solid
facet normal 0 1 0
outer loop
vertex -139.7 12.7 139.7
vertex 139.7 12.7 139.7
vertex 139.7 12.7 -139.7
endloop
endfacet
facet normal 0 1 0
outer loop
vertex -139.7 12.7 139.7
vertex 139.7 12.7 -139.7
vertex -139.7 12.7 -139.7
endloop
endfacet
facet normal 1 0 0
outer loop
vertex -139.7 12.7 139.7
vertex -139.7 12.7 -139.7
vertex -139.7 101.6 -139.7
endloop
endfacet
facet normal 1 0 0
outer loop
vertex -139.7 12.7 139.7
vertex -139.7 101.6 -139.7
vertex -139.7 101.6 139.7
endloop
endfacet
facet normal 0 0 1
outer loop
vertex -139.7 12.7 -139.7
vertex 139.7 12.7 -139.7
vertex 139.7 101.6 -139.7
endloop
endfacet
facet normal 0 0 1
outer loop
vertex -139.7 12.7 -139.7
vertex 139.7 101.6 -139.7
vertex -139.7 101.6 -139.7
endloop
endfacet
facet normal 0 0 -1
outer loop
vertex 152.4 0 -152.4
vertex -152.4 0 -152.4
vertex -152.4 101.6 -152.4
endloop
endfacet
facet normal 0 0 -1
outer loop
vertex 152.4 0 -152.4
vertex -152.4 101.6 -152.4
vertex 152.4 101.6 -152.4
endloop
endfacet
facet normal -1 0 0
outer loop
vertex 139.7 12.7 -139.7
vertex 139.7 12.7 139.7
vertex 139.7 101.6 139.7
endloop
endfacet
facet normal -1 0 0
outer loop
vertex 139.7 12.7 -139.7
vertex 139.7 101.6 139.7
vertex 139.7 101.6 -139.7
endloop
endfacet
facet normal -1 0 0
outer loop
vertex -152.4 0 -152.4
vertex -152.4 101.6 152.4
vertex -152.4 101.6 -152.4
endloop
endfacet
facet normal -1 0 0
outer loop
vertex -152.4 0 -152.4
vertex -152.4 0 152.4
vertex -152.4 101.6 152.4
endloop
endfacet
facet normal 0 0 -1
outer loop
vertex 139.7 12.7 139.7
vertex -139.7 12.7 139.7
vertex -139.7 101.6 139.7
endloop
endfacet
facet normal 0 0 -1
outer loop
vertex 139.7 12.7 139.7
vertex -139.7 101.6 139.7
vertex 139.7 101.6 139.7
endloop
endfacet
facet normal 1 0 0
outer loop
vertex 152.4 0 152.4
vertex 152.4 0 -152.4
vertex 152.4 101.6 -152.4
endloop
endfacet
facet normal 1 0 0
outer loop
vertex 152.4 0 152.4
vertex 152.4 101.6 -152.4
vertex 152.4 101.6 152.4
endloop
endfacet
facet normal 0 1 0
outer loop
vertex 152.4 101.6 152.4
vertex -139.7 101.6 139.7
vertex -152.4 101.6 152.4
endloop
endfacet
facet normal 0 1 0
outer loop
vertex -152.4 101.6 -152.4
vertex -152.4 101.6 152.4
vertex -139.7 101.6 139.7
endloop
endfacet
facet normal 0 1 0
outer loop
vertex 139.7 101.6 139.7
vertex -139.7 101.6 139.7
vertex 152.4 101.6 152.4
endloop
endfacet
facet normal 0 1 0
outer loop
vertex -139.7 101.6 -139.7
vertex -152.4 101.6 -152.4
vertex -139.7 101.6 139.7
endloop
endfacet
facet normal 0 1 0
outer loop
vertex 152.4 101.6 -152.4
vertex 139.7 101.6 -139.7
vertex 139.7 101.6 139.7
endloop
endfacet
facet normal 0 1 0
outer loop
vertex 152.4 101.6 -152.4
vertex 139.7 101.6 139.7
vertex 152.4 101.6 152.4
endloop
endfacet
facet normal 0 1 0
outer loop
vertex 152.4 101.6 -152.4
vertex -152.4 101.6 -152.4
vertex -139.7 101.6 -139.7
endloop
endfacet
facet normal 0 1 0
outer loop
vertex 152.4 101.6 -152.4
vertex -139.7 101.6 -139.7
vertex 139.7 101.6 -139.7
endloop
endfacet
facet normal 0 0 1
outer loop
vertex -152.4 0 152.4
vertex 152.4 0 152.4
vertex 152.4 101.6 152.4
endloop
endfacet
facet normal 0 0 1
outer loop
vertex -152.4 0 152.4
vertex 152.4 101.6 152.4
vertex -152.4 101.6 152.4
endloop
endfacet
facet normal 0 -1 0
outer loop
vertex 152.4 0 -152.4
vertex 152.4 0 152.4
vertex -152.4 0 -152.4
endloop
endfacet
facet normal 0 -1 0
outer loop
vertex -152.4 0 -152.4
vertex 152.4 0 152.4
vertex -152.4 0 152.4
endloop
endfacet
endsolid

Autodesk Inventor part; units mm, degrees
ref_plane "YZ Plane" through (0, 0, 0) normal (1, 0, 0) x (0, 1, 0)
ref_plane "XZ Plane" through (0, 0, 0) normal (0, 1, 0) x (-1, 0, 0)
ref_plane "XY Plane" through (0, 0, 0) normal (0, 0, 1) x (1, 0, 0)
sketch "Sketch1" plane through (0, 0, 0) normal (0, 1, 0) x (-1, 0, 0)
  line L0 (0, 0) -> (0, 152.4)
  line L1 (0, 152.4) -> (152.4, 152.4)
  line L2 (152.4, 152.4) -> (152.4, -152.4)
  line L3 (152.4, -152.4) -> (-152.4, -152.4)
  line L4 (-152.4, -152.4) -> (-152.4, 152.4)
  line L5 (-152.4, 152.4) -> (0, 152.4)
  dimension "d0" = 152.4
  dimension "d1" = 152.4
  dimension "d2" = 304.8
  dimension "d3" = 90
  dimension "d4" = 304.8
extrude "Extrusion1" add sketch "Sketch1" along normal blind 12.7
sketch "Sketch2" plane through (0, 12.7, 0) normal (0, 1, 0) x (1, 0, 0)
  line L0 (-152.4, -152.4) -> (152.4, -152.4) projected
  line L1 (-152.4, -152.4) -> (-152.4, -139.7)
  line L2 (-152.4, 152.4) -> (-152.4, -152.4) projected
  line L3 (-152.4, -139.7) -> (152.4, -139.7)
  line L4 (152.4, -152.4) -> (152.4, 152.4) projected
  line L5 (152.4, -139.7) -> (139.7, -139.7)
  line L6 (139.7, -139.7) -> (139.7, 139.7)
  line L7 (139.7, 139.7) -> (-139.7, 139.7)
  line L8 (-139.7, 139.7) -> (-139.7, -139.7)
  line L9 (152.4, 152.4) -> (-152.4, 152.4) projected
  point P0 (0, 0)
  dimension "d7" = 12.7
  dimension "d8" = 304.8
  dimension "d9" = 12.7
  dimension "d10" = 279.4
  dimension "d11" = 279.4
  dimension "d12" = 90
  dimension "d13" = 279.4
extrude "Extrusion2" add sketch "Sketch2" along normal blind 88.9 contours L1 L3 L4 L0 | L2 L9 L4 L3 L6 L7 L8
properties part number "Box with dimensions"
